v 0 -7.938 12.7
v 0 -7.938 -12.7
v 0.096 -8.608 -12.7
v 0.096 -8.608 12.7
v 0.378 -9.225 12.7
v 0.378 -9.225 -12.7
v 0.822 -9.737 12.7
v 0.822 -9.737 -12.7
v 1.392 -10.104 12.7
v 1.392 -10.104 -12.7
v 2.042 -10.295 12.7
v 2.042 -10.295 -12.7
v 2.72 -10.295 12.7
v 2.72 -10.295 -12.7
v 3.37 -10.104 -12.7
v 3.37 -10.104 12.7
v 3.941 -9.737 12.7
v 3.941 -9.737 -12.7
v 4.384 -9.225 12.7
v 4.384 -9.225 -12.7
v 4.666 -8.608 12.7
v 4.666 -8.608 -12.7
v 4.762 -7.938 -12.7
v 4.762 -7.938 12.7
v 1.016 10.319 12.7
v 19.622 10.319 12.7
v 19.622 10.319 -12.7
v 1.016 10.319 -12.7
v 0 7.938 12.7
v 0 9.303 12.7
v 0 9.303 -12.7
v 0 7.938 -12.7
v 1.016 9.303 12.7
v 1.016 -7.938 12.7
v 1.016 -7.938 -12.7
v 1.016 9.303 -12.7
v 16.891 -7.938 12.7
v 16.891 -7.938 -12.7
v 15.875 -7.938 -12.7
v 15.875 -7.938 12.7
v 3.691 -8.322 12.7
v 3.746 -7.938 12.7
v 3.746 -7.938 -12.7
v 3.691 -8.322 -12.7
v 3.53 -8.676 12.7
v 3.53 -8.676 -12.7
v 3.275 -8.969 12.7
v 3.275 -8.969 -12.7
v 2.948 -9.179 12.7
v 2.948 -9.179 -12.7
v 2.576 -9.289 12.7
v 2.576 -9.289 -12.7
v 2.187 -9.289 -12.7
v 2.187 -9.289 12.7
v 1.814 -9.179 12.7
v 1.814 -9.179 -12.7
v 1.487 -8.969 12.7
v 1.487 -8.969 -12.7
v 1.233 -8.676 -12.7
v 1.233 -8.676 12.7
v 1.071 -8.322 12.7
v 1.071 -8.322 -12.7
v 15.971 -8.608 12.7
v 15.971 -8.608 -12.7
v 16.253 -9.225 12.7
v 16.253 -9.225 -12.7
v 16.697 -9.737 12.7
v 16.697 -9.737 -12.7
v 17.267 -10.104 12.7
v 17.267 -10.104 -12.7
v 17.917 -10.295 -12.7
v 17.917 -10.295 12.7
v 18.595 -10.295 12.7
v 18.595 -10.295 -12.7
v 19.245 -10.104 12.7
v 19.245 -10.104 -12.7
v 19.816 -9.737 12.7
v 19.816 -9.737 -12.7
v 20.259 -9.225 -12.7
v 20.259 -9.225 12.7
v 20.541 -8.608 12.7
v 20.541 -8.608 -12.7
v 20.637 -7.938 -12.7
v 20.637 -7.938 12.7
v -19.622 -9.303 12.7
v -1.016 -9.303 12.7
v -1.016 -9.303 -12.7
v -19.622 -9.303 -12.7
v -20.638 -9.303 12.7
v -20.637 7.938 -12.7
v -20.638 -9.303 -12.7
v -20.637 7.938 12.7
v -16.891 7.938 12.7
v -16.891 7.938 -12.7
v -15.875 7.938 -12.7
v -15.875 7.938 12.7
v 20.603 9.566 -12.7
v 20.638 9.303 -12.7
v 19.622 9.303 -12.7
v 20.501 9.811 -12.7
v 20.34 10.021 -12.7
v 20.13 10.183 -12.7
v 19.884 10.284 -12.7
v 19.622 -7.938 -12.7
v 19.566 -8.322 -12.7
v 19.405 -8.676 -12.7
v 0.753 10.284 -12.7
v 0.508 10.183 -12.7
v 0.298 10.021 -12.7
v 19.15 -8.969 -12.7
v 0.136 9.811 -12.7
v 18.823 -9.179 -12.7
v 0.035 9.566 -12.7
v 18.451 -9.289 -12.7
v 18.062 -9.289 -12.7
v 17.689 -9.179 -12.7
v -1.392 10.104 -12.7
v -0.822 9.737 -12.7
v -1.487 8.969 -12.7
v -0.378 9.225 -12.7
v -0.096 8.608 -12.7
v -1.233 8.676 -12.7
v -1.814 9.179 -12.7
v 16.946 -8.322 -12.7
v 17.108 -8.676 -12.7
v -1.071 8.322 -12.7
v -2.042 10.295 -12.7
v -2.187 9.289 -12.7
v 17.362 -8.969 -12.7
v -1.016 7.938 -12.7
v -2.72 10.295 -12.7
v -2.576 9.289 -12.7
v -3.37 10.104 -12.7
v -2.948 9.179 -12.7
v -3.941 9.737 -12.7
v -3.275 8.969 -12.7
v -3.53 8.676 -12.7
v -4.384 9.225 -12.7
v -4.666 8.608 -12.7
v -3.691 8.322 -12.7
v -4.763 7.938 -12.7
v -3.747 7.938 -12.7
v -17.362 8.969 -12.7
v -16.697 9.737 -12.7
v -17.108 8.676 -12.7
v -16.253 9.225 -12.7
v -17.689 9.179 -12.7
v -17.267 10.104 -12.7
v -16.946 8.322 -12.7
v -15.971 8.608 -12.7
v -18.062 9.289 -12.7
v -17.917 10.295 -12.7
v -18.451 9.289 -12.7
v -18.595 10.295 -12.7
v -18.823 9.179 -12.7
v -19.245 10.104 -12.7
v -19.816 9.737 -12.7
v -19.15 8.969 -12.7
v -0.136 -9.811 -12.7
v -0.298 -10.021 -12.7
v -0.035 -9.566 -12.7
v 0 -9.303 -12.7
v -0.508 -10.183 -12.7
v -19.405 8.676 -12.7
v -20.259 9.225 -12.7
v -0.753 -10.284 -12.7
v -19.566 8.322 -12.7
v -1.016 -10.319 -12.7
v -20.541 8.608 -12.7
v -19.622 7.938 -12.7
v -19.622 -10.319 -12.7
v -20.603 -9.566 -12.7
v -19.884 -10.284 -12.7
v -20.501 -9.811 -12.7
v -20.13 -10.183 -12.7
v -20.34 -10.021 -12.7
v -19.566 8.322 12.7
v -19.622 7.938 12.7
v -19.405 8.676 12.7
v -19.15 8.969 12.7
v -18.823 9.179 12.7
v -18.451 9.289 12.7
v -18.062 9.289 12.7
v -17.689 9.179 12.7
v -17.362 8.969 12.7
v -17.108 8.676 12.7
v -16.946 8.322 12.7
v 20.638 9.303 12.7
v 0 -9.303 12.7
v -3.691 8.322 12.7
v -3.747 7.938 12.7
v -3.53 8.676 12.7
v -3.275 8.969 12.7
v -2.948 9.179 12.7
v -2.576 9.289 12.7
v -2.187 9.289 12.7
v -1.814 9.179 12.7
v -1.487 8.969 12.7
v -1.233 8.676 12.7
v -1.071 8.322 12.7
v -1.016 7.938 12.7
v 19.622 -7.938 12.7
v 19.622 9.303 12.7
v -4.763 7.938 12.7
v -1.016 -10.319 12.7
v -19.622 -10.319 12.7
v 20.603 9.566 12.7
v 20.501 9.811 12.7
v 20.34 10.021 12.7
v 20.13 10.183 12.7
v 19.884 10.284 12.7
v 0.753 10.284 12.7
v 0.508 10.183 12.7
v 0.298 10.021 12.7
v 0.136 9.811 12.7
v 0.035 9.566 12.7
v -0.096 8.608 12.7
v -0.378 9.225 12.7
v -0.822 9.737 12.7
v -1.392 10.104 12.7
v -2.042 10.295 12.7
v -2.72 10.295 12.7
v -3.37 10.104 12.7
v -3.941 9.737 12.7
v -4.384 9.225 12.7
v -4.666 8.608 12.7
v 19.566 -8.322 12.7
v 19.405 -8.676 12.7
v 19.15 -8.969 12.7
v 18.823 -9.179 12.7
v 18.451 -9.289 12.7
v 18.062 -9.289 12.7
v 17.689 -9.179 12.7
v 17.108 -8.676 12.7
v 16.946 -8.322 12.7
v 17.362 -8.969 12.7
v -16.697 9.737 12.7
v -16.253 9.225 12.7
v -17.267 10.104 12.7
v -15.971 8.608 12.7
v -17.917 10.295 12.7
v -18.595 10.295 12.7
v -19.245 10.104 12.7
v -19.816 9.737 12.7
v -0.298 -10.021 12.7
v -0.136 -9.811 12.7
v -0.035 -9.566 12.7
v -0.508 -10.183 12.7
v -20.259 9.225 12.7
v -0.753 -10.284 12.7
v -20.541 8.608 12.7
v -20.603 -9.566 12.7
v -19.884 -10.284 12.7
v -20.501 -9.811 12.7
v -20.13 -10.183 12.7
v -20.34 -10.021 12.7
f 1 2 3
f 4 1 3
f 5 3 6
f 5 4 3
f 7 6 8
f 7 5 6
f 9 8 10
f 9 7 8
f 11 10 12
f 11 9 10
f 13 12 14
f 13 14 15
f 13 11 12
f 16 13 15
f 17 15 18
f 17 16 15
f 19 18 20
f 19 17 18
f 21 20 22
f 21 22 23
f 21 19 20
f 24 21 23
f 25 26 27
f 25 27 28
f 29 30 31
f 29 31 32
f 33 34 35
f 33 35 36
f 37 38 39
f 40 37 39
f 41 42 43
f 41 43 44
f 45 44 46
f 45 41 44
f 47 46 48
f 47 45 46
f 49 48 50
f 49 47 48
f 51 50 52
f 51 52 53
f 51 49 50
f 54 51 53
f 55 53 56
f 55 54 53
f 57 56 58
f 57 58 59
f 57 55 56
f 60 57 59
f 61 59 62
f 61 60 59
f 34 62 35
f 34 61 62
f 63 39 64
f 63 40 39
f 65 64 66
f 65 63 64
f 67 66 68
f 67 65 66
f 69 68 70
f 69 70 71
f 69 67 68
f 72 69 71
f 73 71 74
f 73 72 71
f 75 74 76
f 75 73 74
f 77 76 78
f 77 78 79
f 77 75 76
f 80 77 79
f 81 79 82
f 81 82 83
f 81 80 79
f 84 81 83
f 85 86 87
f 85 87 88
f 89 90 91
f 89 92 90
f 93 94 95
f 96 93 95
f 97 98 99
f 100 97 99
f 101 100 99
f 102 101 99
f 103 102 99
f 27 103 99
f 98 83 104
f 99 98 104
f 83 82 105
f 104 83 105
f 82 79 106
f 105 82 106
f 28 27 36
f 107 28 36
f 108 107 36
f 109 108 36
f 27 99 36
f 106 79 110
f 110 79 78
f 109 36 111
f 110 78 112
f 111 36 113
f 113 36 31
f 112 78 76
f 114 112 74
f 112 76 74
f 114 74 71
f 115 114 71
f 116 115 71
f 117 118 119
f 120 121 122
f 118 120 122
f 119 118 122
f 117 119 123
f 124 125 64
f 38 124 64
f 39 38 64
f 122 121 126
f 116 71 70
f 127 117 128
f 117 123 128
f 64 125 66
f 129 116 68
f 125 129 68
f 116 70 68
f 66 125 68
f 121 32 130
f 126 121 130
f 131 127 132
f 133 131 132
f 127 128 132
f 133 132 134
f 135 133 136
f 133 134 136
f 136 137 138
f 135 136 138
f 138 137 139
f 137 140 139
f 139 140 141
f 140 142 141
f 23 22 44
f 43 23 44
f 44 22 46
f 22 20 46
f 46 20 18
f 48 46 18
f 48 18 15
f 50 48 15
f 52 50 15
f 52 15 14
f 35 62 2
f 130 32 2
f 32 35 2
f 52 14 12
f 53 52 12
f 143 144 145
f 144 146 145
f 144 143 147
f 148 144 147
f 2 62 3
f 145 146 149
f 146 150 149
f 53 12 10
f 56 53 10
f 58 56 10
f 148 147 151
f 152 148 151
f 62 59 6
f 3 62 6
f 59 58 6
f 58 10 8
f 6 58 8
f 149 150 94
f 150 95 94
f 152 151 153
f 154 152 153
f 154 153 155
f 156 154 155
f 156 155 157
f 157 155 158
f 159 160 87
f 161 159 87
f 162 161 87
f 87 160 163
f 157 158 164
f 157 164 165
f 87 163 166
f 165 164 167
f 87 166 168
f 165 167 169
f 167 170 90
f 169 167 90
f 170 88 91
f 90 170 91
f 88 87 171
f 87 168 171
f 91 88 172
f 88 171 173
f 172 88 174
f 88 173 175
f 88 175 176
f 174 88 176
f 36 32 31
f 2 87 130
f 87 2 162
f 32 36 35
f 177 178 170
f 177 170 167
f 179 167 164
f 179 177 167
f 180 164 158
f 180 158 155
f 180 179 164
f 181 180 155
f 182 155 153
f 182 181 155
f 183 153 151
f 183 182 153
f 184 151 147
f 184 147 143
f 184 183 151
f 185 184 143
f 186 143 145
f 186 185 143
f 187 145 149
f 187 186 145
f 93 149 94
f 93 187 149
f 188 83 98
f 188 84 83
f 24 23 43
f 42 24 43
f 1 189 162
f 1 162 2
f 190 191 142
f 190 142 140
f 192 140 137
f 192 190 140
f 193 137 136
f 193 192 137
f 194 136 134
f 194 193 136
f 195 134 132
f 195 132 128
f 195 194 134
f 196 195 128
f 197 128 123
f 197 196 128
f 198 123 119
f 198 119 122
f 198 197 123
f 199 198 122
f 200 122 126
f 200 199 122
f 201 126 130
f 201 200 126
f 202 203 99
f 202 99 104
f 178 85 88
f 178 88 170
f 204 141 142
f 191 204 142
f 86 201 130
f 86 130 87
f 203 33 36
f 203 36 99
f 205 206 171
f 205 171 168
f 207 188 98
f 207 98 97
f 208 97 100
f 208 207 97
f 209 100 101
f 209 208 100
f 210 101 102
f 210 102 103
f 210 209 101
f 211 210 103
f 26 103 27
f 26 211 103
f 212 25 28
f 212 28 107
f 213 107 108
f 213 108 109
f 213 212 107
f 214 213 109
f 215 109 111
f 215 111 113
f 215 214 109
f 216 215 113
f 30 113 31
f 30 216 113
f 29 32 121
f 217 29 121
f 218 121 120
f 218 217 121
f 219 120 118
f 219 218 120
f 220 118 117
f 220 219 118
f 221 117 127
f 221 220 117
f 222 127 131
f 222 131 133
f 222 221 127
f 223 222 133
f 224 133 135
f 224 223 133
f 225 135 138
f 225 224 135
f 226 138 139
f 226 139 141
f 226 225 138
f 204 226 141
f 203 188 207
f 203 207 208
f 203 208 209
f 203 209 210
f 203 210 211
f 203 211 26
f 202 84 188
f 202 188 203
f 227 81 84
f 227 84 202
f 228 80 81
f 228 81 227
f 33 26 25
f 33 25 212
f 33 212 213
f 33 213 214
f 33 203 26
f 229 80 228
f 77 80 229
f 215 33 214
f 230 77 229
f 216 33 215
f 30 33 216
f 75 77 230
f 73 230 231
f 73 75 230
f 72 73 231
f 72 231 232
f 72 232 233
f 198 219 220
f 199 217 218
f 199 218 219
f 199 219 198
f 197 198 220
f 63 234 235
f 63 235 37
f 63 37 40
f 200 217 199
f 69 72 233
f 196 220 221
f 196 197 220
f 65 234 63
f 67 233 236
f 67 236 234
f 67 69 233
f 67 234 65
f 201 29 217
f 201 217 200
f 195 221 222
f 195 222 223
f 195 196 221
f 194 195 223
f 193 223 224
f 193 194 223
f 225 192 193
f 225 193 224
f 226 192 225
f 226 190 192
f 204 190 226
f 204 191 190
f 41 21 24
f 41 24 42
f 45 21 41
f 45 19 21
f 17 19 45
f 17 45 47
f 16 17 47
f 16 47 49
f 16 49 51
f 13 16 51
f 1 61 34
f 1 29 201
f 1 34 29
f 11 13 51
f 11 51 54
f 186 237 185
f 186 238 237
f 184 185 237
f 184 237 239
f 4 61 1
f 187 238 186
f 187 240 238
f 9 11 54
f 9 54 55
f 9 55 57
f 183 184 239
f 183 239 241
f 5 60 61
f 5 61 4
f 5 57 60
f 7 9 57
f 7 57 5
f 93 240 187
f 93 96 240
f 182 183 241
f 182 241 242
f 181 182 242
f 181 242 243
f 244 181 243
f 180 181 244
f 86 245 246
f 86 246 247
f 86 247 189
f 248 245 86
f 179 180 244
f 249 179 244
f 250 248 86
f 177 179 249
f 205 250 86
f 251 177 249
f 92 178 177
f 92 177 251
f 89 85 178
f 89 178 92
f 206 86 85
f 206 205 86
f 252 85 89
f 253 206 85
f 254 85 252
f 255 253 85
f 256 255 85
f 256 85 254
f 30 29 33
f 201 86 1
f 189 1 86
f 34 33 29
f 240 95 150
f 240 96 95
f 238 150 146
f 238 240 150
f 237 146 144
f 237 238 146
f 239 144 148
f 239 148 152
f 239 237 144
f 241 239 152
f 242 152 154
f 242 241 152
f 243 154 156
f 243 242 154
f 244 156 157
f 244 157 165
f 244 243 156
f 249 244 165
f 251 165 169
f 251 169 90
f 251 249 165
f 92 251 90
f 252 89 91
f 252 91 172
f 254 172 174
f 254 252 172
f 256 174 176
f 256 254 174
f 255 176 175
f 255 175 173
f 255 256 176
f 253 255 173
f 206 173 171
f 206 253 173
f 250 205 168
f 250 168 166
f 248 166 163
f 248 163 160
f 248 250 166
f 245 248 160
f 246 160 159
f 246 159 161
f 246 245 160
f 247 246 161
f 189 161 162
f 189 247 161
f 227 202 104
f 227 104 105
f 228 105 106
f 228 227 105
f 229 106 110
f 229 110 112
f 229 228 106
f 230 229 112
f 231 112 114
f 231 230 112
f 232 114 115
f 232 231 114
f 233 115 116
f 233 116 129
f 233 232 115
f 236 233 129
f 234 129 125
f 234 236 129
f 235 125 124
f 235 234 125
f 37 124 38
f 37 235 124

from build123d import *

# Parameters (mm, degrees)
BASE_EXTRUDE_DEPTH = 12.7
CIRPATTERN1_COUNT  = 2


with BuildPart() as part:
    # Sketch1 → Base-Extrude (new, symmetric)
    with BuildSketch(Plane.XY):
        with BuildLine():
            Line((-20.6375, 7.9375), (-20.6375, -9.30275))
            ThreePointArc((-20.6375, -9.30275), (-20.33992049, -10.02117049), (-19.6215, -10.31875))
            Line((-19.6215, -10.31875), (-1.016, -10.31875))
            ThreePointArc((-1.016, -10.31875), (-0.29757951, -10.02117049), (0, -9.30275))
            Line((0, -9.30275), (0, 7.9375))
            ThreePointArc((0, 7.9375), (-2.38125, 10.31875), (-4.7625, 7.9375))
            Line((-4.7625, 7.9375), (-3.7465, 7.9375))
            ThreePointArc((-3.7465, 7.9375), (-2.38125, 9.30275), (-1.016, 7.9375))
            Line((-1.016, 7.9375), (-1.016, -9.30275))
            Line((-1.016, -9.30275), (-19.6215, -9.30275))
            Line((-19.6215, -9.30275), (-19.6215, 7.9375))
            ThreePointArc((-19.6215, 7.9375), (-18.25625, 9.30275), (-16.891, 7.9375))
            Line((-16.891, 7.9375), (-15.875, 7.9375))
            ThreePointArc((-15.875, 7.9375), (-18.25625, 10.31875), (-20.6375, 7.9375))
        make_face()
    base_extrude = extrude(amount=BASE_EXTRUDE_DEPTH, both=True)

    # CirPattern1: Base-Extrude ×2 about axis
    cirpattern1_axis = Axis((0, 0, 0), (0, 0, 1))
    for i in range(1, CIRPATTERN1_COUNT):
        add(base_extrude.rotate(cirpattern1_axis, i * 360 / CIRPATTERN1_COUNT))


solid = part.part
